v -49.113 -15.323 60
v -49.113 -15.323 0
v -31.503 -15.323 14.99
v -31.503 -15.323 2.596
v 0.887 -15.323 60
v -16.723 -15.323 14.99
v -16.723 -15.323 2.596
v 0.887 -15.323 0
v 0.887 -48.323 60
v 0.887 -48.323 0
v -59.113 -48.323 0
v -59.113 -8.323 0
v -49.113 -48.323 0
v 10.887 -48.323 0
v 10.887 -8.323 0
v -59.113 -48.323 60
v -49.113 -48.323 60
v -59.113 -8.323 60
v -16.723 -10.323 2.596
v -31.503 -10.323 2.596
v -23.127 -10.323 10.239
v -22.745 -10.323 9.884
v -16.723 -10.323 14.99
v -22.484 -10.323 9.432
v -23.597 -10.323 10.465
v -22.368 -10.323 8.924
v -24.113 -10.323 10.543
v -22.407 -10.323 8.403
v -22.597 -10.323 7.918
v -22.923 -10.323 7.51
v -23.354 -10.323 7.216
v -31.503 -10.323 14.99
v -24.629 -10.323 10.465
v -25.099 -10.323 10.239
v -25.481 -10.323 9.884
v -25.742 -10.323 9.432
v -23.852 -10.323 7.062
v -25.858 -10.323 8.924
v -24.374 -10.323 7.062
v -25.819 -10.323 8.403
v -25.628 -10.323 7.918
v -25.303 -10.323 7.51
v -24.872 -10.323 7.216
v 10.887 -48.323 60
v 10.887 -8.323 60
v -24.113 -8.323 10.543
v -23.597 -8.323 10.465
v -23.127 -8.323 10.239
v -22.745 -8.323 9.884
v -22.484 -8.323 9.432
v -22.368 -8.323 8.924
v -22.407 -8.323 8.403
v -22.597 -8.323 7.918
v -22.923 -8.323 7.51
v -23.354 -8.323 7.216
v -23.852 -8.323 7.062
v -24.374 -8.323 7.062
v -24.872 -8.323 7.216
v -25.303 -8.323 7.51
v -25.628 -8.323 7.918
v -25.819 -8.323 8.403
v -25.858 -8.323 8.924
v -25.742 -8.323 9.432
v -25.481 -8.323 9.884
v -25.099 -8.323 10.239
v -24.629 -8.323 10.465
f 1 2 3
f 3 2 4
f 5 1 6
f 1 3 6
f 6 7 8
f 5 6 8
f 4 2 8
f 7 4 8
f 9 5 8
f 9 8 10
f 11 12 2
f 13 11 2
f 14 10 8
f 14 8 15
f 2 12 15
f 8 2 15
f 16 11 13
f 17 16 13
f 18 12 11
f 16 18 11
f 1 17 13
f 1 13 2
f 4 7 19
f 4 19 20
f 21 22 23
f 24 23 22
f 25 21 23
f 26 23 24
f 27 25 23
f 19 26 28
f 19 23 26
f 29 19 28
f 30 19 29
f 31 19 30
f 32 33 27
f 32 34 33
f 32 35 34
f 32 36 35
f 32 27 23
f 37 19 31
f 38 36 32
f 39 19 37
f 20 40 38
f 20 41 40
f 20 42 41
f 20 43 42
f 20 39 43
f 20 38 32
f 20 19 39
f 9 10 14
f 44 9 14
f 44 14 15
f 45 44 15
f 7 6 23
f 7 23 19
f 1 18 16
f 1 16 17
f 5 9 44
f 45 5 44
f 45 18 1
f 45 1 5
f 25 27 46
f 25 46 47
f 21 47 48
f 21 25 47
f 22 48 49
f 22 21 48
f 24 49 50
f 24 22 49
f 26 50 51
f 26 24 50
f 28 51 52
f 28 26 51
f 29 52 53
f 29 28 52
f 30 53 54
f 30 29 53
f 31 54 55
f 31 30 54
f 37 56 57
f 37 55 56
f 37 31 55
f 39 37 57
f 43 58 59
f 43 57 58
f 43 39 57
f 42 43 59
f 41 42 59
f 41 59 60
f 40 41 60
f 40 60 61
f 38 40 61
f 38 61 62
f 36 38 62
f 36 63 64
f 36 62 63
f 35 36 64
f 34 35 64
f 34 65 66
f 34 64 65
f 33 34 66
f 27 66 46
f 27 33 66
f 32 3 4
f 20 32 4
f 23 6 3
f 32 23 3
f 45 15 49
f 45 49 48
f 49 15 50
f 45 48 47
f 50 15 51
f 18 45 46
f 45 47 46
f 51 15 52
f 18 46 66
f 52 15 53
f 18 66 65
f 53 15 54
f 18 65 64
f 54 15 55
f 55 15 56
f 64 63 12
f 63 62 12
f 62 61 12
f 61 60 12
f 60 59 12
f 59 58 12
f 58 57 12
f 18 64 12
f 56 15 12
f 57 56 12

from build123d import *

# Parameters (mm, degrees)
BOSS_EXTRUDE1_DEPTH     = 60
CUT_EXTRUDE1_DEPTH      = 91.461766578
CUT_EXTRUDE1_DEPTH_BACK = 91.461766578
SKETCH2_R               = 1.75
SKETCH3_W               = 14.779269325
SKETCH3_H               = 12.394379378
CUT_EXTRUDE2_DEPTH      = 5


with BuildPart() as part:
    # Sketch1 → Boss-Extrude1 (new body)
    with BuildSketch(Plane.XY):
        Polygon((-59.112868416, -8.322842348), (-59.112868416, -48.322842348), (-49.112868416, -48.322842348), (-49.112868416, -15.322842348), (0.887131584, -15.322842348), (0.887131584, -48.322842348), (10.887131584, -48.322842348), (10.887131584, -8.322842348), align=None)
    extrude(amount=BOSS_EXTRUDE1_DEPTH)

    # Sketch2 → Cut-Extrude1 (cut, two sides: drawn at the far end of the back side and taken through both)
    with BuildSketch(Plane(origin=(0, -15.322842348, 0), x_dir=(1, 0, 0), z_dir=(0, 1, 0)).offset(-CUT_EXTRUDE1_DEPTH_BACK)):
        with Locations(Location((-24.112868416, -8.79280196, 0), (0, 0, 270))):
            Circle(SKETCH2_R)
    extrude(amount=CUT_EXTRUDE1_DEPTH + CUT_EXTRUDE1_DEPTH_BACK, mode=Mode.SUBTRACT)

    # Sketch3 → Cut-Extrude2 (cut)
    with BuildSketch(Plane(origin=(0, -15.322842348, 0), x_dir=(-1, 0, 0), z_dir=(0, -1, 0))):
        with Locations((24.112868416, -8.79280196)):
            Rectangle(SKETCH3_W, SKETCH3_H)
    extrude(amount=-CUT_EXTRUDE2_DEPTH, mode=Mode.SUBTRACT)


solid = part.part
